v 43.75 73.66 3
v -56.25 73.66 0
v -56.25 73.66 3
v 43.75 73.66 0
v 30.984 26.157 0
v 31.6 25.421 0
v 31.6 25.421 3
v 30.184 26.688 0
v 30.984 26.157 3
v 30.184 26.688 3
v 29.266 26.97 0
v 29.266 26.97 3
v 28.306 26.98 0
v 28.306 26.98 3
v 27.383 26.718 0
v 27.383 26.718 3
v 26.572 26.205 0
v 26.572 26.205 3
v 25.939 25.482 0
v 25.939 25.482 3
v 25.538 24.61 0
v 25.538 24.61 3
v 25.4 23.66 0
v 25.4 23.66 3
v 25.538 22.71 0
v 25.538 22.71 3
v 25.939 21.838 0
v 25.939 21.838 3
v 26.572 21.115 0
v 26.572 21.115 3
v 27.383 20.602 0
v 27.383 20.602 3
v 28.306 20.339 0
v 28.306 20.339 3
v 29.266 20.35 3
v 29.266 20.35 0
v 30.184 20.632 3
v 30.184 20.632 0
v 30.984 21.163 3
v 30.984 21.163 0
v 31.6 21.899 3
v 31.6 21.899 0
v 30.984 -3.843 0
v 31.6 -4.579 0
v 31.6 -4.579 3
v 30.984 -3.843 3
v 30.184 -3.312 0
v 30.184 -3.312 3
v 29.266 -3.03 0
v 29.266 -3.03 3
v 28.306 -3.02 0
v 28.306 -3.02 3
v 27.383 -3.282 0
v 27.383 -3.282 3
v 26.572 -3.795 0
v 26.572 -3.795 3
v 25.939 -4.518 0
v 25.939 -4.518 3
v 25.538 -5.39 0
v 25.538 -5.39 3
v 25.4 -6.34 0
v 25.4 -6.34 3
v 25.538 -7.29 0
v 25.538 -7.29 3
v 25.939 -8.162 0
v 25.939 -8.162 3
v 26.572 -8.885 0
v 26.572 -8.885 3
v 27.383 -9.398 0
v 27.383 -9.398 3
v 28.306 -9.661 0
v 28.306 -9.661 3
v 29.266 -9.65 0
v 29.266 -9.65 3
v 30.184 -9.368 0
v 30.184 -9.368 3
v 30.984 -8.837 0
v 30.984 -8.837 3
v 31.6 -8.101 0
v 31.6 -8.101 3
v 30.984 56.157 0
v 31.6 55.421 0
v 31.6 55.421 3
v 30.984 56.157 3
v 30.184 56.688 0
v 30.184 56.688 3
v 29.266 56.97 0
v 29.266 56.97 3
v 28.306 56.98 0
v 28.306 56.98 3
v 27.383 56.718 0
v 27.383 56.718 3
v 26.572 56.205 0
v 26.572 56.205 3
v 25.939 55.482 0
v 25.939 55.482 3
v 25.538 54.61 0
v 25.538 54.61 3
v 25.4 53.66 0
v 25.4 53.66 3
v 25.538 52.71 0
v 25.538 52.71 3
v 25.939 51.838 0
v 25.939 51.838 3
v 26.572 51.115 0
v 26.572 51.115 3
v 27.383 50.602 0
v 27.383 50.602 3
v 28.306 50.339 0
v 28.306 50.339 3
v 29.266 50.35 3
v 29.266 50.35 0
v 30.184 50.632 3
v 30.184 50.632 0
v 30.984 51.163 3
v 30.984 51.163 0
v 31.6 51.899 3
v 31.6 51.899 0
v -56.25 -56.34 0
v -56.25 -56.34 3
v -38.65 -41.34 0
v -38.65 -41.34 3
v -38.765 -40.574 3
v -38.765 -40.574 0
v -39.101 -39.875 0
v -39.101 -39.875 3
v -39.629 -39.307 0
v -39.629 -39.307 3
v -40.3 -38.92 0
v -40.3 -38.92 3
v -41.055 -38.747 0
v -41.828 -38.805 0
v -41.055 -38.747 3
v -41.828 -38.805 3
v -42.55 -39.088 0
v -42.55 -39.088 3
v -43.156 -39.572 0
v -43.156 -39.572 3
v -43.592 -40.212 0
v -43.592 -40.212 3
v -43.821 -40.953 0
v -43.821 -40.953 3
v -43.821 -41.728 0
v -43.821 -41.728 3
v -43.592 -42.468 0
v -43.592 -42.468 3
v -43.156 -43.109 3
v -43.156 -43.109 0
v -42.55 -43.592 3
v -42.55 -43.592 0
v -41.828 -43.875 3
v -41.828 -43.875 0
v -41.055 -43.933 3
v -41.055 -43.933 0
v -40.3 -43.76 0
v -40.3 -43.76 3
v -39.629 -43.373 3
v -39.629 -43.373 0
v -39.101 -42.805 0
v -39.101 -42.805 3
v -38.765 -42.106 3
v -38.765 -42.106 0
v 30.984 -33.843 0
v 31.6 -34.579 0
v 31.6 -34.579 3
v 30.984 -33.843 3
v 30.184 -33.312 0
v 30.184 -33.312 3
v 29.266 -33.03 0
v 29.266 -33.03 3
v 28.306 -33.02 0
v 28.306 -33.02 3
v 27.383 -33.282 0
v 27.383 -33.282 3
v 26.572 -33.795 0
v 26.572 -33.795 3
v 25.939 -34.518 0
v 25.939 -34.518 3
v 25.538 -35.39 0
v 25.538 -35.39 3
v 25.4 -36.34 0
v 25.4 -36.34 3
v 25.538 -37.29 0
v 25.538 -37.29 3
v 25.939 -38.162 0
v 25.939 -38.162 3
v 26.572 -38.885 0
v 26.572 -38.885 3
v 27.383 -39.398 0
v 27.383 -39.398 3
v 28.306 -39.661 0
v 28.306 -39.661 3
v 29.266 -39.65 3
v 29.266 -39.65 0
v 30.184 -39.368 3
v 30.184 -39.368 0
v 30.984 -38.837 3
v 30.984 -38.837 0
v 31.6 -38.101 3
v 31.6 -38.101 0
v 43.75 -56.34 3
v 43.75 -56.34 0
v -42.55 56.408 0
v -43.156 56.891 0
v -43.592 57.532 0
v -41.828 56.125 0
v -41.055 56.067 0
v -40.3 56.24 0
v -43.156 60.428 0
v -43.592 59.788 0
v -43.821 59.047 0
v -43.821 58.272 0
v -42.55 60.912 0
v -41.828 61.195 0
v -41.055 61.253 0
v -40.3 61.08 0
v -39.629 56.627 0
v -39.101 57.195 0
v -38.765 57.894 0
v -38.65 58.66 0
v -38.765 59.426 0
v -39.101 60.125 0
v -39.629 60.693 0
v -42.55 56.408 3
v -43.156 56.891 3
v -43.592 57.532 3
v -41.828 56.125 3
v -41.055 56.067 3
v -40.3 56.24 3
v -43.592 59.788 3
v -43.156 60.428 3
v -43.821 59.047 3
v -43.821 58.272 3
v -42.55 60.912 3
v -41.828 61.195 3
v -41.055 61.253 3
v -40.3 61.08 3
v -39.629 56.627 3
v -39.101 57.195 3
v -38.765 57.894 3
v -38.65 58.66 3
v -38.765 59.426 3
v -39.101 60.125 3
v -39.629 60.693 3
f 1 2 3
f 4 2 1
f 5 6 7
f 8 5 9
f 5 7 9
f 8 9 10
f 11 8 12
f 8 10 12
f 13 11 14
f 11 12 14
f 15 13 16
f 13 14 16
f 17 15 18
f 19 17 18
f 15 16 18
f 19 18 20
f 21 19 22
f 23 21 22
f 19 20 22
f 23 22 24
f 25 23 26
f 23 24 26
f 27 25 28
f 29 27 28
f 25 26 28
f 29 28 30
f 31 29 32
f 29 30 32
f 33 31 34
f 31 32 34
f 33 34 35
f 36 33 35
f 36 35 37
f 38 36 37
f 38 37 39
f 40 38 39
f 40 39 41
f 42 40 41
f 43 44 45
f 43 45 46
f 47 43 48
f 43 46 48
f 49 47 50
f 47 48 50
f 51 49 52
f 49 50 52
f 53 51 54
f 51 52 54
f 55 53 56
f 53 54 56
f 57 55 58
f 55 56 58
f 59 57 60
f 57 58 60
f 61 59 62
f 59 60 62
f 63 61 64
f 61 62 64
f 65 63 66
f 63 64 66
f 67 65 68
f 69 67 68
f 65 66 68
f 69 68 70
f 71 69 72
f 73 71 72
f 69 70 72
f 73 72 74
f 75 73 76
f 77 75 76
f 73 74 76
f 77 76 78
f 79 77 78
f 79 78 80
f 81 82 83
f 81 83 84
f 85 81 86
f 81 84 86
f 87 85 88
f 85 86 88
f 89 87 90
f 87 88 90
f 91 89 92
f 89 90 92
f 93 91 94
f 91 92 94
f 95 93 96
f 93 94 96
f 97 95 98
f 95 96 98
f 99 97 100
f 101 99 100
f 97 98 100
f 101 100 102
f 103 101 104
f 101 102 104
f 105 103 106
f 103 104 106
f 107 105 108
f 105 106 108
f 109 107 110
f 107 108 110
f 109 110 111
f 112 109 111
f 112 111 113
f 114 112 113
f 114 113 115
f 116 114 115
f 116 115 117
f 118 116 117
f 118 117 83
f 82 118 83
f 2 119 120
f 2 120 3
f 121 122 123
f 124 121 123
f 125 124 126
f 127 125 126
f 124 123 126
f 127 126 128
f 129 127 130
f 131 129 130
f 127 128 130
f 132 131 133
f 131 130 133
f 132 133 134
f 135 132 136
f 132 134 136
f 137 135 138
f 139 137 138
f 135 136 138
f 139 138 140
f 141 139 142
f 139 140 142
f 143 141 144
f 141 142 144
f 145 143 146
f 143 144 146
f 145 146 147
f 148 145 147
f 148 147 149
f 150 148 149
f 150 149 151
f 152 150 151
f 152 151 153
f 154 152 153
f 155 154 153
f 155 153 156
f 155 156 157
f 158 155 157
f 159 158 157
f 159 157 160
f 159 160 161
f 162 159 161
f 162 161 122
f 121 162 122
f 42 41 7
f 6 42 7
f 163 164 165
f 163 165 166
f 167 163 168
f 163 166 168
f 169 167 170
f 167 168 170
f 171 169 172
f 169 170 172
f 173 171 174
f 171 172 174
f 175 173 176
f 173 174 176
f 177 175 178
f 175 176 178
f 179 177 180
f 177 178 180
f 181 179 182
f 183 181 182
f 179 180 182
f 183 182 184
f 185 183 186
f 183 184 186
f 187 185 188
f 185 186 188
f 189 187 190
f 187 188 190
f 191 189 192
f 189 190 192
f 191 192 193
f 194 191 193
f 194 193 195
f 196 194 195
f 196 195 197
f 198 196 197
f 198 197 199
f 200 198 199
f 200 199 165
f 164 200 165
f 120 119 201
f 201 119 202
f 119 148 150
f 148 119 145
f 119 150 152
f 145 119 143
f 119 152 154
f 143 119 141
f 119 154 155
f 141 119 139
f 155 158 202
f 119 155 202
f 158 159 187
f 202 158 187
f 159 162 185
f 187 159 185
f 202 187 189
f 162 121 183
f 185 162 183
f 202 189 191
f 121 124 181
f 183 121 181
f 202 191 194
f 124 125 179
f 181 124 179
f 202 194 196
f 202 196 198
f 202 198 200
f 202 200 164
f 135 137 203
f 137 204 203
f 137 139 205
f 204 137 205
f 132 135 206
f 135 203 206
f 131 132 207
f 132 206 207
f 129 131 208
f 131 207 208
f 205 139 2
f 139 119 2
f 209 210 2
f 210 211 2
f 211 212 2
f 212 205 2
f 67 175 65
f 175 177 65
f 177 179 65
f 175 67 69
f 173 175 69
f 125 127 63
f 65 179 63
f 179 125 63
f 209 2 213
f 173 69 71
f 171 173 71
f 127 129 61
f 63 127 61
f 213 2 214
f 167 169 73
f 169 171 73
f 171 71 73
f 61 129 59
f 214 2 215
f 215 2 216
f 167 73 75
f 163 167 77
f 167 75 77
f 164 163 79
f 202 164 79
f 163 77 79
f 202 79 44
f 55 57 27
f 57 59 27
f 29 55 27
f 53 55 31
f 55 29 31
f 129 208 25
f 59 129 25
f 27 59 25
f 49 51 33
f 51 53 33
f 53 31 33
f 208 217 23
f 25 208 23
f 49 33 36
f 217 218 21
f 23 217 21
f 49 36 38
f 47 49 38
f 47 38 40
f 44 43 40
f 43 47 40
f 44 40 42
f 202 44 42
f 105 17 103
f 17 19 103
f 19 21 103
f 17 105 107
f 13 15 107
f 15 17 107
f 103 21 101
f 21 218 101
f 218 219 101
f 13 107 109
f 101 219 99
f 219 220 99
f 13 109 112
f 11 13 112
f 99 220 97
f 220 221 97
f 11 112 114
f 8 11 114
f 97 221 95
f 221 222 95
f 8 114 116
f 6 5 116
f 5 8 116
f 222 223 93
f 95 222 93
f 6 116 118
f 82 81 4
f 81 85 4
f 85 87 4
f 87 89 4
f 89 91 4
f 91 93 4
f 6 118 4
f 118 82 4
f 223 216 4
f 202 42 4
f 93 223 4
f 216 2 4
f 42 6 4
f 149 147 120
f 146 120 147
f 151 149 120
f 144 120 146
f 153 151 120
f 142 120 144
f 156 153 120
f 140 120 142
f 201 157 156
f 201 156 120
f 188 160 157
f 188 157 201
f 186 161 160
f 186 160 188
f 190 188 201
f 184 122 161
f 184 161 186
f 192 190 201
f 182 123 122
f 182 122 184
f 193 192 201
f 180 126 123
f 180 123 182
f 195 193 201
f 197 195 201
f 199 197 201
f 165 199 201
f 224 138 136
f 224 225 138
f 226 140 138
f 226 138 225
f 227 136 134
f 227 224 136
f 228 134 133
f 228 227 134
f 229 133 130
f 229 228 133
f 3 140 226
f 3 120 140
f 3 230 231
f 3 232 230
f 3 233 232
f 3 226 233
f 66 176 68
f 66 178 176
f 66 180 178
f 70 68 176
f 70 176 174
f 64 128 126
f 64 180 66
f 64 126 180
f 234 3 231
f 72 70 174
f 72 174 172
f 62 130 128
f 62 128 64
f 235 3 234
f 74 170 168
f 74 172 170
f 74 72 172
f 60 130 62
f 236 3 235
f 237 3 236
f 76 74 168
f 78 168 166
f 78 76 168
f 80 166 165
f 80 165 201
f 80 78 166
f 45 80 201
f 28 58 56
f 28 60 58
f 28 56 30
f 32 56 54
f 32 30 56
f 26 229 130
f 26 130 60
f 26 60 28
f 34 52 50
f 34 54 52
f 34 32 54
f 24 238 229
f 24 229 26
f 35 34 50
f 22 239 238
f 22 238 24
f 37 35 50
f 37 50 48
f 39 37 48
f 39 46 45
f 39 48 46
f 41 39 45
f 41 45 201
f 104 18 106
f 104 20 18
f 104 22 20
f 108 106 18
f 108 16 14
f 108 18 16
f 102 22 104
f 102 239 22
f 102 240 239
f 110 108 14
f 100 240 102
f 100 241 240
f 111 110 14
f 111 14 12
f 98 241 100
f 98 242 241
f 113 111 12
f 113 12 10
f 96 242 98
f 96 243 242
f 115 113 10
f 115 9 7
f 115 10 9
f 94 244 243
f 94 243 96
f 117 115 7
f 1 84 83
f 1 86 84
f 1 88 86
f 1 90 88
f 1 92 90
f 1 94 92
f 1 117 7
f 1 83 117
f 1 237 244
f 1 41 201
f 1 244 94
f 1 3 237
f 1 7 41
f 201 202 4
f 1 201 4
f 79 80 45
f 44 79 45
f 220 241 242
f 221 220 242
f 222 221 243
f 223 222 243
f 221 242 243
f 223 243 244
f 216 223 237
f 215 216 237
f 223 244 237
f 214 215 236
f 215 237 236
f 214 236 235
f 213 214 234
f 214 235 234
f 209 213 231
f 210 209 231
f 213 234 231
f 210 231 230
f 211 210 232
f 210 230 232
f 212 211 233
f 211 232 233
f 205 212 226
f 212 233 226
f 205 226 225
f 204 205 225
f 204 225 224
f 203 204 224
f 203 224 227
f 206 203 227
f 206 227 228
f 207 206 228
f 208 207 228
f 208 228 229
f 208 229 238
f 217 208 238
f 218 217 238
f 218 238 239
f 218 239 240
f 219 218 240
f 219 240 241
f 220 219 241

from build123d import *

# Parameters (mm, degrees)
F0_W     = 100
F0_H     = 130
F1_DEPTH = 3
F2_R     = 2.6
F3_DEPTH = 3.001
F4_R     = 3.35
F5_DEPTH = 3.001
F6_W     = 130
F6_H     = 3
F7_DEPTH = 12.15


with BuildPart() as f1:
    # F0 (on Top) → F1 (new body)
    with BuildSketch(Plane.XY):
        with Locations((-6.249699, 8.659933)):
            Rectangle(F0_W, F0_H)
    extrude(amount=F1_DEPTH)

    # F2 (on face) → F3 (cut, through all)
    with BuildSketch(Plane.XY.offset(3)):
        with Locations((-41.249699, -41.340067)):
            Circle(F2_R)
        with Locations((-41.249699, 58.659933)):
            Circle(F2_R)
    extrude(amount=-F3_DEPTH, mode=Mode.SUBTRACT)

    # F4 (on face) → F5 (cut, through all)
    with BuildSketch(Plane.XY.offset(3)):
        with Locations((28.750301, -36.340067)):
            Circle(F4_R)
        with Locations((28.750301, -6.340067)):
            Circle(F4_R)
        with Locations((28.750301, 23.659933)):
            Circle(F4_R)
        with Locations((28.750301, 53.659933)):
            Circle(F4_R)
    extrude(amount=-F5_DEPTH, mode=Mode.SUBTRACT)

    # F6 (on face) → F7 (join)
    with BuildSketch(Plane.YZ.offset(43.750301)):
        with Locations((8.659933, 1.5)):
            Rectangle(F6_W, F6_H)
    extrude(amount=-F7_DEPTH)


solid = f1.part
